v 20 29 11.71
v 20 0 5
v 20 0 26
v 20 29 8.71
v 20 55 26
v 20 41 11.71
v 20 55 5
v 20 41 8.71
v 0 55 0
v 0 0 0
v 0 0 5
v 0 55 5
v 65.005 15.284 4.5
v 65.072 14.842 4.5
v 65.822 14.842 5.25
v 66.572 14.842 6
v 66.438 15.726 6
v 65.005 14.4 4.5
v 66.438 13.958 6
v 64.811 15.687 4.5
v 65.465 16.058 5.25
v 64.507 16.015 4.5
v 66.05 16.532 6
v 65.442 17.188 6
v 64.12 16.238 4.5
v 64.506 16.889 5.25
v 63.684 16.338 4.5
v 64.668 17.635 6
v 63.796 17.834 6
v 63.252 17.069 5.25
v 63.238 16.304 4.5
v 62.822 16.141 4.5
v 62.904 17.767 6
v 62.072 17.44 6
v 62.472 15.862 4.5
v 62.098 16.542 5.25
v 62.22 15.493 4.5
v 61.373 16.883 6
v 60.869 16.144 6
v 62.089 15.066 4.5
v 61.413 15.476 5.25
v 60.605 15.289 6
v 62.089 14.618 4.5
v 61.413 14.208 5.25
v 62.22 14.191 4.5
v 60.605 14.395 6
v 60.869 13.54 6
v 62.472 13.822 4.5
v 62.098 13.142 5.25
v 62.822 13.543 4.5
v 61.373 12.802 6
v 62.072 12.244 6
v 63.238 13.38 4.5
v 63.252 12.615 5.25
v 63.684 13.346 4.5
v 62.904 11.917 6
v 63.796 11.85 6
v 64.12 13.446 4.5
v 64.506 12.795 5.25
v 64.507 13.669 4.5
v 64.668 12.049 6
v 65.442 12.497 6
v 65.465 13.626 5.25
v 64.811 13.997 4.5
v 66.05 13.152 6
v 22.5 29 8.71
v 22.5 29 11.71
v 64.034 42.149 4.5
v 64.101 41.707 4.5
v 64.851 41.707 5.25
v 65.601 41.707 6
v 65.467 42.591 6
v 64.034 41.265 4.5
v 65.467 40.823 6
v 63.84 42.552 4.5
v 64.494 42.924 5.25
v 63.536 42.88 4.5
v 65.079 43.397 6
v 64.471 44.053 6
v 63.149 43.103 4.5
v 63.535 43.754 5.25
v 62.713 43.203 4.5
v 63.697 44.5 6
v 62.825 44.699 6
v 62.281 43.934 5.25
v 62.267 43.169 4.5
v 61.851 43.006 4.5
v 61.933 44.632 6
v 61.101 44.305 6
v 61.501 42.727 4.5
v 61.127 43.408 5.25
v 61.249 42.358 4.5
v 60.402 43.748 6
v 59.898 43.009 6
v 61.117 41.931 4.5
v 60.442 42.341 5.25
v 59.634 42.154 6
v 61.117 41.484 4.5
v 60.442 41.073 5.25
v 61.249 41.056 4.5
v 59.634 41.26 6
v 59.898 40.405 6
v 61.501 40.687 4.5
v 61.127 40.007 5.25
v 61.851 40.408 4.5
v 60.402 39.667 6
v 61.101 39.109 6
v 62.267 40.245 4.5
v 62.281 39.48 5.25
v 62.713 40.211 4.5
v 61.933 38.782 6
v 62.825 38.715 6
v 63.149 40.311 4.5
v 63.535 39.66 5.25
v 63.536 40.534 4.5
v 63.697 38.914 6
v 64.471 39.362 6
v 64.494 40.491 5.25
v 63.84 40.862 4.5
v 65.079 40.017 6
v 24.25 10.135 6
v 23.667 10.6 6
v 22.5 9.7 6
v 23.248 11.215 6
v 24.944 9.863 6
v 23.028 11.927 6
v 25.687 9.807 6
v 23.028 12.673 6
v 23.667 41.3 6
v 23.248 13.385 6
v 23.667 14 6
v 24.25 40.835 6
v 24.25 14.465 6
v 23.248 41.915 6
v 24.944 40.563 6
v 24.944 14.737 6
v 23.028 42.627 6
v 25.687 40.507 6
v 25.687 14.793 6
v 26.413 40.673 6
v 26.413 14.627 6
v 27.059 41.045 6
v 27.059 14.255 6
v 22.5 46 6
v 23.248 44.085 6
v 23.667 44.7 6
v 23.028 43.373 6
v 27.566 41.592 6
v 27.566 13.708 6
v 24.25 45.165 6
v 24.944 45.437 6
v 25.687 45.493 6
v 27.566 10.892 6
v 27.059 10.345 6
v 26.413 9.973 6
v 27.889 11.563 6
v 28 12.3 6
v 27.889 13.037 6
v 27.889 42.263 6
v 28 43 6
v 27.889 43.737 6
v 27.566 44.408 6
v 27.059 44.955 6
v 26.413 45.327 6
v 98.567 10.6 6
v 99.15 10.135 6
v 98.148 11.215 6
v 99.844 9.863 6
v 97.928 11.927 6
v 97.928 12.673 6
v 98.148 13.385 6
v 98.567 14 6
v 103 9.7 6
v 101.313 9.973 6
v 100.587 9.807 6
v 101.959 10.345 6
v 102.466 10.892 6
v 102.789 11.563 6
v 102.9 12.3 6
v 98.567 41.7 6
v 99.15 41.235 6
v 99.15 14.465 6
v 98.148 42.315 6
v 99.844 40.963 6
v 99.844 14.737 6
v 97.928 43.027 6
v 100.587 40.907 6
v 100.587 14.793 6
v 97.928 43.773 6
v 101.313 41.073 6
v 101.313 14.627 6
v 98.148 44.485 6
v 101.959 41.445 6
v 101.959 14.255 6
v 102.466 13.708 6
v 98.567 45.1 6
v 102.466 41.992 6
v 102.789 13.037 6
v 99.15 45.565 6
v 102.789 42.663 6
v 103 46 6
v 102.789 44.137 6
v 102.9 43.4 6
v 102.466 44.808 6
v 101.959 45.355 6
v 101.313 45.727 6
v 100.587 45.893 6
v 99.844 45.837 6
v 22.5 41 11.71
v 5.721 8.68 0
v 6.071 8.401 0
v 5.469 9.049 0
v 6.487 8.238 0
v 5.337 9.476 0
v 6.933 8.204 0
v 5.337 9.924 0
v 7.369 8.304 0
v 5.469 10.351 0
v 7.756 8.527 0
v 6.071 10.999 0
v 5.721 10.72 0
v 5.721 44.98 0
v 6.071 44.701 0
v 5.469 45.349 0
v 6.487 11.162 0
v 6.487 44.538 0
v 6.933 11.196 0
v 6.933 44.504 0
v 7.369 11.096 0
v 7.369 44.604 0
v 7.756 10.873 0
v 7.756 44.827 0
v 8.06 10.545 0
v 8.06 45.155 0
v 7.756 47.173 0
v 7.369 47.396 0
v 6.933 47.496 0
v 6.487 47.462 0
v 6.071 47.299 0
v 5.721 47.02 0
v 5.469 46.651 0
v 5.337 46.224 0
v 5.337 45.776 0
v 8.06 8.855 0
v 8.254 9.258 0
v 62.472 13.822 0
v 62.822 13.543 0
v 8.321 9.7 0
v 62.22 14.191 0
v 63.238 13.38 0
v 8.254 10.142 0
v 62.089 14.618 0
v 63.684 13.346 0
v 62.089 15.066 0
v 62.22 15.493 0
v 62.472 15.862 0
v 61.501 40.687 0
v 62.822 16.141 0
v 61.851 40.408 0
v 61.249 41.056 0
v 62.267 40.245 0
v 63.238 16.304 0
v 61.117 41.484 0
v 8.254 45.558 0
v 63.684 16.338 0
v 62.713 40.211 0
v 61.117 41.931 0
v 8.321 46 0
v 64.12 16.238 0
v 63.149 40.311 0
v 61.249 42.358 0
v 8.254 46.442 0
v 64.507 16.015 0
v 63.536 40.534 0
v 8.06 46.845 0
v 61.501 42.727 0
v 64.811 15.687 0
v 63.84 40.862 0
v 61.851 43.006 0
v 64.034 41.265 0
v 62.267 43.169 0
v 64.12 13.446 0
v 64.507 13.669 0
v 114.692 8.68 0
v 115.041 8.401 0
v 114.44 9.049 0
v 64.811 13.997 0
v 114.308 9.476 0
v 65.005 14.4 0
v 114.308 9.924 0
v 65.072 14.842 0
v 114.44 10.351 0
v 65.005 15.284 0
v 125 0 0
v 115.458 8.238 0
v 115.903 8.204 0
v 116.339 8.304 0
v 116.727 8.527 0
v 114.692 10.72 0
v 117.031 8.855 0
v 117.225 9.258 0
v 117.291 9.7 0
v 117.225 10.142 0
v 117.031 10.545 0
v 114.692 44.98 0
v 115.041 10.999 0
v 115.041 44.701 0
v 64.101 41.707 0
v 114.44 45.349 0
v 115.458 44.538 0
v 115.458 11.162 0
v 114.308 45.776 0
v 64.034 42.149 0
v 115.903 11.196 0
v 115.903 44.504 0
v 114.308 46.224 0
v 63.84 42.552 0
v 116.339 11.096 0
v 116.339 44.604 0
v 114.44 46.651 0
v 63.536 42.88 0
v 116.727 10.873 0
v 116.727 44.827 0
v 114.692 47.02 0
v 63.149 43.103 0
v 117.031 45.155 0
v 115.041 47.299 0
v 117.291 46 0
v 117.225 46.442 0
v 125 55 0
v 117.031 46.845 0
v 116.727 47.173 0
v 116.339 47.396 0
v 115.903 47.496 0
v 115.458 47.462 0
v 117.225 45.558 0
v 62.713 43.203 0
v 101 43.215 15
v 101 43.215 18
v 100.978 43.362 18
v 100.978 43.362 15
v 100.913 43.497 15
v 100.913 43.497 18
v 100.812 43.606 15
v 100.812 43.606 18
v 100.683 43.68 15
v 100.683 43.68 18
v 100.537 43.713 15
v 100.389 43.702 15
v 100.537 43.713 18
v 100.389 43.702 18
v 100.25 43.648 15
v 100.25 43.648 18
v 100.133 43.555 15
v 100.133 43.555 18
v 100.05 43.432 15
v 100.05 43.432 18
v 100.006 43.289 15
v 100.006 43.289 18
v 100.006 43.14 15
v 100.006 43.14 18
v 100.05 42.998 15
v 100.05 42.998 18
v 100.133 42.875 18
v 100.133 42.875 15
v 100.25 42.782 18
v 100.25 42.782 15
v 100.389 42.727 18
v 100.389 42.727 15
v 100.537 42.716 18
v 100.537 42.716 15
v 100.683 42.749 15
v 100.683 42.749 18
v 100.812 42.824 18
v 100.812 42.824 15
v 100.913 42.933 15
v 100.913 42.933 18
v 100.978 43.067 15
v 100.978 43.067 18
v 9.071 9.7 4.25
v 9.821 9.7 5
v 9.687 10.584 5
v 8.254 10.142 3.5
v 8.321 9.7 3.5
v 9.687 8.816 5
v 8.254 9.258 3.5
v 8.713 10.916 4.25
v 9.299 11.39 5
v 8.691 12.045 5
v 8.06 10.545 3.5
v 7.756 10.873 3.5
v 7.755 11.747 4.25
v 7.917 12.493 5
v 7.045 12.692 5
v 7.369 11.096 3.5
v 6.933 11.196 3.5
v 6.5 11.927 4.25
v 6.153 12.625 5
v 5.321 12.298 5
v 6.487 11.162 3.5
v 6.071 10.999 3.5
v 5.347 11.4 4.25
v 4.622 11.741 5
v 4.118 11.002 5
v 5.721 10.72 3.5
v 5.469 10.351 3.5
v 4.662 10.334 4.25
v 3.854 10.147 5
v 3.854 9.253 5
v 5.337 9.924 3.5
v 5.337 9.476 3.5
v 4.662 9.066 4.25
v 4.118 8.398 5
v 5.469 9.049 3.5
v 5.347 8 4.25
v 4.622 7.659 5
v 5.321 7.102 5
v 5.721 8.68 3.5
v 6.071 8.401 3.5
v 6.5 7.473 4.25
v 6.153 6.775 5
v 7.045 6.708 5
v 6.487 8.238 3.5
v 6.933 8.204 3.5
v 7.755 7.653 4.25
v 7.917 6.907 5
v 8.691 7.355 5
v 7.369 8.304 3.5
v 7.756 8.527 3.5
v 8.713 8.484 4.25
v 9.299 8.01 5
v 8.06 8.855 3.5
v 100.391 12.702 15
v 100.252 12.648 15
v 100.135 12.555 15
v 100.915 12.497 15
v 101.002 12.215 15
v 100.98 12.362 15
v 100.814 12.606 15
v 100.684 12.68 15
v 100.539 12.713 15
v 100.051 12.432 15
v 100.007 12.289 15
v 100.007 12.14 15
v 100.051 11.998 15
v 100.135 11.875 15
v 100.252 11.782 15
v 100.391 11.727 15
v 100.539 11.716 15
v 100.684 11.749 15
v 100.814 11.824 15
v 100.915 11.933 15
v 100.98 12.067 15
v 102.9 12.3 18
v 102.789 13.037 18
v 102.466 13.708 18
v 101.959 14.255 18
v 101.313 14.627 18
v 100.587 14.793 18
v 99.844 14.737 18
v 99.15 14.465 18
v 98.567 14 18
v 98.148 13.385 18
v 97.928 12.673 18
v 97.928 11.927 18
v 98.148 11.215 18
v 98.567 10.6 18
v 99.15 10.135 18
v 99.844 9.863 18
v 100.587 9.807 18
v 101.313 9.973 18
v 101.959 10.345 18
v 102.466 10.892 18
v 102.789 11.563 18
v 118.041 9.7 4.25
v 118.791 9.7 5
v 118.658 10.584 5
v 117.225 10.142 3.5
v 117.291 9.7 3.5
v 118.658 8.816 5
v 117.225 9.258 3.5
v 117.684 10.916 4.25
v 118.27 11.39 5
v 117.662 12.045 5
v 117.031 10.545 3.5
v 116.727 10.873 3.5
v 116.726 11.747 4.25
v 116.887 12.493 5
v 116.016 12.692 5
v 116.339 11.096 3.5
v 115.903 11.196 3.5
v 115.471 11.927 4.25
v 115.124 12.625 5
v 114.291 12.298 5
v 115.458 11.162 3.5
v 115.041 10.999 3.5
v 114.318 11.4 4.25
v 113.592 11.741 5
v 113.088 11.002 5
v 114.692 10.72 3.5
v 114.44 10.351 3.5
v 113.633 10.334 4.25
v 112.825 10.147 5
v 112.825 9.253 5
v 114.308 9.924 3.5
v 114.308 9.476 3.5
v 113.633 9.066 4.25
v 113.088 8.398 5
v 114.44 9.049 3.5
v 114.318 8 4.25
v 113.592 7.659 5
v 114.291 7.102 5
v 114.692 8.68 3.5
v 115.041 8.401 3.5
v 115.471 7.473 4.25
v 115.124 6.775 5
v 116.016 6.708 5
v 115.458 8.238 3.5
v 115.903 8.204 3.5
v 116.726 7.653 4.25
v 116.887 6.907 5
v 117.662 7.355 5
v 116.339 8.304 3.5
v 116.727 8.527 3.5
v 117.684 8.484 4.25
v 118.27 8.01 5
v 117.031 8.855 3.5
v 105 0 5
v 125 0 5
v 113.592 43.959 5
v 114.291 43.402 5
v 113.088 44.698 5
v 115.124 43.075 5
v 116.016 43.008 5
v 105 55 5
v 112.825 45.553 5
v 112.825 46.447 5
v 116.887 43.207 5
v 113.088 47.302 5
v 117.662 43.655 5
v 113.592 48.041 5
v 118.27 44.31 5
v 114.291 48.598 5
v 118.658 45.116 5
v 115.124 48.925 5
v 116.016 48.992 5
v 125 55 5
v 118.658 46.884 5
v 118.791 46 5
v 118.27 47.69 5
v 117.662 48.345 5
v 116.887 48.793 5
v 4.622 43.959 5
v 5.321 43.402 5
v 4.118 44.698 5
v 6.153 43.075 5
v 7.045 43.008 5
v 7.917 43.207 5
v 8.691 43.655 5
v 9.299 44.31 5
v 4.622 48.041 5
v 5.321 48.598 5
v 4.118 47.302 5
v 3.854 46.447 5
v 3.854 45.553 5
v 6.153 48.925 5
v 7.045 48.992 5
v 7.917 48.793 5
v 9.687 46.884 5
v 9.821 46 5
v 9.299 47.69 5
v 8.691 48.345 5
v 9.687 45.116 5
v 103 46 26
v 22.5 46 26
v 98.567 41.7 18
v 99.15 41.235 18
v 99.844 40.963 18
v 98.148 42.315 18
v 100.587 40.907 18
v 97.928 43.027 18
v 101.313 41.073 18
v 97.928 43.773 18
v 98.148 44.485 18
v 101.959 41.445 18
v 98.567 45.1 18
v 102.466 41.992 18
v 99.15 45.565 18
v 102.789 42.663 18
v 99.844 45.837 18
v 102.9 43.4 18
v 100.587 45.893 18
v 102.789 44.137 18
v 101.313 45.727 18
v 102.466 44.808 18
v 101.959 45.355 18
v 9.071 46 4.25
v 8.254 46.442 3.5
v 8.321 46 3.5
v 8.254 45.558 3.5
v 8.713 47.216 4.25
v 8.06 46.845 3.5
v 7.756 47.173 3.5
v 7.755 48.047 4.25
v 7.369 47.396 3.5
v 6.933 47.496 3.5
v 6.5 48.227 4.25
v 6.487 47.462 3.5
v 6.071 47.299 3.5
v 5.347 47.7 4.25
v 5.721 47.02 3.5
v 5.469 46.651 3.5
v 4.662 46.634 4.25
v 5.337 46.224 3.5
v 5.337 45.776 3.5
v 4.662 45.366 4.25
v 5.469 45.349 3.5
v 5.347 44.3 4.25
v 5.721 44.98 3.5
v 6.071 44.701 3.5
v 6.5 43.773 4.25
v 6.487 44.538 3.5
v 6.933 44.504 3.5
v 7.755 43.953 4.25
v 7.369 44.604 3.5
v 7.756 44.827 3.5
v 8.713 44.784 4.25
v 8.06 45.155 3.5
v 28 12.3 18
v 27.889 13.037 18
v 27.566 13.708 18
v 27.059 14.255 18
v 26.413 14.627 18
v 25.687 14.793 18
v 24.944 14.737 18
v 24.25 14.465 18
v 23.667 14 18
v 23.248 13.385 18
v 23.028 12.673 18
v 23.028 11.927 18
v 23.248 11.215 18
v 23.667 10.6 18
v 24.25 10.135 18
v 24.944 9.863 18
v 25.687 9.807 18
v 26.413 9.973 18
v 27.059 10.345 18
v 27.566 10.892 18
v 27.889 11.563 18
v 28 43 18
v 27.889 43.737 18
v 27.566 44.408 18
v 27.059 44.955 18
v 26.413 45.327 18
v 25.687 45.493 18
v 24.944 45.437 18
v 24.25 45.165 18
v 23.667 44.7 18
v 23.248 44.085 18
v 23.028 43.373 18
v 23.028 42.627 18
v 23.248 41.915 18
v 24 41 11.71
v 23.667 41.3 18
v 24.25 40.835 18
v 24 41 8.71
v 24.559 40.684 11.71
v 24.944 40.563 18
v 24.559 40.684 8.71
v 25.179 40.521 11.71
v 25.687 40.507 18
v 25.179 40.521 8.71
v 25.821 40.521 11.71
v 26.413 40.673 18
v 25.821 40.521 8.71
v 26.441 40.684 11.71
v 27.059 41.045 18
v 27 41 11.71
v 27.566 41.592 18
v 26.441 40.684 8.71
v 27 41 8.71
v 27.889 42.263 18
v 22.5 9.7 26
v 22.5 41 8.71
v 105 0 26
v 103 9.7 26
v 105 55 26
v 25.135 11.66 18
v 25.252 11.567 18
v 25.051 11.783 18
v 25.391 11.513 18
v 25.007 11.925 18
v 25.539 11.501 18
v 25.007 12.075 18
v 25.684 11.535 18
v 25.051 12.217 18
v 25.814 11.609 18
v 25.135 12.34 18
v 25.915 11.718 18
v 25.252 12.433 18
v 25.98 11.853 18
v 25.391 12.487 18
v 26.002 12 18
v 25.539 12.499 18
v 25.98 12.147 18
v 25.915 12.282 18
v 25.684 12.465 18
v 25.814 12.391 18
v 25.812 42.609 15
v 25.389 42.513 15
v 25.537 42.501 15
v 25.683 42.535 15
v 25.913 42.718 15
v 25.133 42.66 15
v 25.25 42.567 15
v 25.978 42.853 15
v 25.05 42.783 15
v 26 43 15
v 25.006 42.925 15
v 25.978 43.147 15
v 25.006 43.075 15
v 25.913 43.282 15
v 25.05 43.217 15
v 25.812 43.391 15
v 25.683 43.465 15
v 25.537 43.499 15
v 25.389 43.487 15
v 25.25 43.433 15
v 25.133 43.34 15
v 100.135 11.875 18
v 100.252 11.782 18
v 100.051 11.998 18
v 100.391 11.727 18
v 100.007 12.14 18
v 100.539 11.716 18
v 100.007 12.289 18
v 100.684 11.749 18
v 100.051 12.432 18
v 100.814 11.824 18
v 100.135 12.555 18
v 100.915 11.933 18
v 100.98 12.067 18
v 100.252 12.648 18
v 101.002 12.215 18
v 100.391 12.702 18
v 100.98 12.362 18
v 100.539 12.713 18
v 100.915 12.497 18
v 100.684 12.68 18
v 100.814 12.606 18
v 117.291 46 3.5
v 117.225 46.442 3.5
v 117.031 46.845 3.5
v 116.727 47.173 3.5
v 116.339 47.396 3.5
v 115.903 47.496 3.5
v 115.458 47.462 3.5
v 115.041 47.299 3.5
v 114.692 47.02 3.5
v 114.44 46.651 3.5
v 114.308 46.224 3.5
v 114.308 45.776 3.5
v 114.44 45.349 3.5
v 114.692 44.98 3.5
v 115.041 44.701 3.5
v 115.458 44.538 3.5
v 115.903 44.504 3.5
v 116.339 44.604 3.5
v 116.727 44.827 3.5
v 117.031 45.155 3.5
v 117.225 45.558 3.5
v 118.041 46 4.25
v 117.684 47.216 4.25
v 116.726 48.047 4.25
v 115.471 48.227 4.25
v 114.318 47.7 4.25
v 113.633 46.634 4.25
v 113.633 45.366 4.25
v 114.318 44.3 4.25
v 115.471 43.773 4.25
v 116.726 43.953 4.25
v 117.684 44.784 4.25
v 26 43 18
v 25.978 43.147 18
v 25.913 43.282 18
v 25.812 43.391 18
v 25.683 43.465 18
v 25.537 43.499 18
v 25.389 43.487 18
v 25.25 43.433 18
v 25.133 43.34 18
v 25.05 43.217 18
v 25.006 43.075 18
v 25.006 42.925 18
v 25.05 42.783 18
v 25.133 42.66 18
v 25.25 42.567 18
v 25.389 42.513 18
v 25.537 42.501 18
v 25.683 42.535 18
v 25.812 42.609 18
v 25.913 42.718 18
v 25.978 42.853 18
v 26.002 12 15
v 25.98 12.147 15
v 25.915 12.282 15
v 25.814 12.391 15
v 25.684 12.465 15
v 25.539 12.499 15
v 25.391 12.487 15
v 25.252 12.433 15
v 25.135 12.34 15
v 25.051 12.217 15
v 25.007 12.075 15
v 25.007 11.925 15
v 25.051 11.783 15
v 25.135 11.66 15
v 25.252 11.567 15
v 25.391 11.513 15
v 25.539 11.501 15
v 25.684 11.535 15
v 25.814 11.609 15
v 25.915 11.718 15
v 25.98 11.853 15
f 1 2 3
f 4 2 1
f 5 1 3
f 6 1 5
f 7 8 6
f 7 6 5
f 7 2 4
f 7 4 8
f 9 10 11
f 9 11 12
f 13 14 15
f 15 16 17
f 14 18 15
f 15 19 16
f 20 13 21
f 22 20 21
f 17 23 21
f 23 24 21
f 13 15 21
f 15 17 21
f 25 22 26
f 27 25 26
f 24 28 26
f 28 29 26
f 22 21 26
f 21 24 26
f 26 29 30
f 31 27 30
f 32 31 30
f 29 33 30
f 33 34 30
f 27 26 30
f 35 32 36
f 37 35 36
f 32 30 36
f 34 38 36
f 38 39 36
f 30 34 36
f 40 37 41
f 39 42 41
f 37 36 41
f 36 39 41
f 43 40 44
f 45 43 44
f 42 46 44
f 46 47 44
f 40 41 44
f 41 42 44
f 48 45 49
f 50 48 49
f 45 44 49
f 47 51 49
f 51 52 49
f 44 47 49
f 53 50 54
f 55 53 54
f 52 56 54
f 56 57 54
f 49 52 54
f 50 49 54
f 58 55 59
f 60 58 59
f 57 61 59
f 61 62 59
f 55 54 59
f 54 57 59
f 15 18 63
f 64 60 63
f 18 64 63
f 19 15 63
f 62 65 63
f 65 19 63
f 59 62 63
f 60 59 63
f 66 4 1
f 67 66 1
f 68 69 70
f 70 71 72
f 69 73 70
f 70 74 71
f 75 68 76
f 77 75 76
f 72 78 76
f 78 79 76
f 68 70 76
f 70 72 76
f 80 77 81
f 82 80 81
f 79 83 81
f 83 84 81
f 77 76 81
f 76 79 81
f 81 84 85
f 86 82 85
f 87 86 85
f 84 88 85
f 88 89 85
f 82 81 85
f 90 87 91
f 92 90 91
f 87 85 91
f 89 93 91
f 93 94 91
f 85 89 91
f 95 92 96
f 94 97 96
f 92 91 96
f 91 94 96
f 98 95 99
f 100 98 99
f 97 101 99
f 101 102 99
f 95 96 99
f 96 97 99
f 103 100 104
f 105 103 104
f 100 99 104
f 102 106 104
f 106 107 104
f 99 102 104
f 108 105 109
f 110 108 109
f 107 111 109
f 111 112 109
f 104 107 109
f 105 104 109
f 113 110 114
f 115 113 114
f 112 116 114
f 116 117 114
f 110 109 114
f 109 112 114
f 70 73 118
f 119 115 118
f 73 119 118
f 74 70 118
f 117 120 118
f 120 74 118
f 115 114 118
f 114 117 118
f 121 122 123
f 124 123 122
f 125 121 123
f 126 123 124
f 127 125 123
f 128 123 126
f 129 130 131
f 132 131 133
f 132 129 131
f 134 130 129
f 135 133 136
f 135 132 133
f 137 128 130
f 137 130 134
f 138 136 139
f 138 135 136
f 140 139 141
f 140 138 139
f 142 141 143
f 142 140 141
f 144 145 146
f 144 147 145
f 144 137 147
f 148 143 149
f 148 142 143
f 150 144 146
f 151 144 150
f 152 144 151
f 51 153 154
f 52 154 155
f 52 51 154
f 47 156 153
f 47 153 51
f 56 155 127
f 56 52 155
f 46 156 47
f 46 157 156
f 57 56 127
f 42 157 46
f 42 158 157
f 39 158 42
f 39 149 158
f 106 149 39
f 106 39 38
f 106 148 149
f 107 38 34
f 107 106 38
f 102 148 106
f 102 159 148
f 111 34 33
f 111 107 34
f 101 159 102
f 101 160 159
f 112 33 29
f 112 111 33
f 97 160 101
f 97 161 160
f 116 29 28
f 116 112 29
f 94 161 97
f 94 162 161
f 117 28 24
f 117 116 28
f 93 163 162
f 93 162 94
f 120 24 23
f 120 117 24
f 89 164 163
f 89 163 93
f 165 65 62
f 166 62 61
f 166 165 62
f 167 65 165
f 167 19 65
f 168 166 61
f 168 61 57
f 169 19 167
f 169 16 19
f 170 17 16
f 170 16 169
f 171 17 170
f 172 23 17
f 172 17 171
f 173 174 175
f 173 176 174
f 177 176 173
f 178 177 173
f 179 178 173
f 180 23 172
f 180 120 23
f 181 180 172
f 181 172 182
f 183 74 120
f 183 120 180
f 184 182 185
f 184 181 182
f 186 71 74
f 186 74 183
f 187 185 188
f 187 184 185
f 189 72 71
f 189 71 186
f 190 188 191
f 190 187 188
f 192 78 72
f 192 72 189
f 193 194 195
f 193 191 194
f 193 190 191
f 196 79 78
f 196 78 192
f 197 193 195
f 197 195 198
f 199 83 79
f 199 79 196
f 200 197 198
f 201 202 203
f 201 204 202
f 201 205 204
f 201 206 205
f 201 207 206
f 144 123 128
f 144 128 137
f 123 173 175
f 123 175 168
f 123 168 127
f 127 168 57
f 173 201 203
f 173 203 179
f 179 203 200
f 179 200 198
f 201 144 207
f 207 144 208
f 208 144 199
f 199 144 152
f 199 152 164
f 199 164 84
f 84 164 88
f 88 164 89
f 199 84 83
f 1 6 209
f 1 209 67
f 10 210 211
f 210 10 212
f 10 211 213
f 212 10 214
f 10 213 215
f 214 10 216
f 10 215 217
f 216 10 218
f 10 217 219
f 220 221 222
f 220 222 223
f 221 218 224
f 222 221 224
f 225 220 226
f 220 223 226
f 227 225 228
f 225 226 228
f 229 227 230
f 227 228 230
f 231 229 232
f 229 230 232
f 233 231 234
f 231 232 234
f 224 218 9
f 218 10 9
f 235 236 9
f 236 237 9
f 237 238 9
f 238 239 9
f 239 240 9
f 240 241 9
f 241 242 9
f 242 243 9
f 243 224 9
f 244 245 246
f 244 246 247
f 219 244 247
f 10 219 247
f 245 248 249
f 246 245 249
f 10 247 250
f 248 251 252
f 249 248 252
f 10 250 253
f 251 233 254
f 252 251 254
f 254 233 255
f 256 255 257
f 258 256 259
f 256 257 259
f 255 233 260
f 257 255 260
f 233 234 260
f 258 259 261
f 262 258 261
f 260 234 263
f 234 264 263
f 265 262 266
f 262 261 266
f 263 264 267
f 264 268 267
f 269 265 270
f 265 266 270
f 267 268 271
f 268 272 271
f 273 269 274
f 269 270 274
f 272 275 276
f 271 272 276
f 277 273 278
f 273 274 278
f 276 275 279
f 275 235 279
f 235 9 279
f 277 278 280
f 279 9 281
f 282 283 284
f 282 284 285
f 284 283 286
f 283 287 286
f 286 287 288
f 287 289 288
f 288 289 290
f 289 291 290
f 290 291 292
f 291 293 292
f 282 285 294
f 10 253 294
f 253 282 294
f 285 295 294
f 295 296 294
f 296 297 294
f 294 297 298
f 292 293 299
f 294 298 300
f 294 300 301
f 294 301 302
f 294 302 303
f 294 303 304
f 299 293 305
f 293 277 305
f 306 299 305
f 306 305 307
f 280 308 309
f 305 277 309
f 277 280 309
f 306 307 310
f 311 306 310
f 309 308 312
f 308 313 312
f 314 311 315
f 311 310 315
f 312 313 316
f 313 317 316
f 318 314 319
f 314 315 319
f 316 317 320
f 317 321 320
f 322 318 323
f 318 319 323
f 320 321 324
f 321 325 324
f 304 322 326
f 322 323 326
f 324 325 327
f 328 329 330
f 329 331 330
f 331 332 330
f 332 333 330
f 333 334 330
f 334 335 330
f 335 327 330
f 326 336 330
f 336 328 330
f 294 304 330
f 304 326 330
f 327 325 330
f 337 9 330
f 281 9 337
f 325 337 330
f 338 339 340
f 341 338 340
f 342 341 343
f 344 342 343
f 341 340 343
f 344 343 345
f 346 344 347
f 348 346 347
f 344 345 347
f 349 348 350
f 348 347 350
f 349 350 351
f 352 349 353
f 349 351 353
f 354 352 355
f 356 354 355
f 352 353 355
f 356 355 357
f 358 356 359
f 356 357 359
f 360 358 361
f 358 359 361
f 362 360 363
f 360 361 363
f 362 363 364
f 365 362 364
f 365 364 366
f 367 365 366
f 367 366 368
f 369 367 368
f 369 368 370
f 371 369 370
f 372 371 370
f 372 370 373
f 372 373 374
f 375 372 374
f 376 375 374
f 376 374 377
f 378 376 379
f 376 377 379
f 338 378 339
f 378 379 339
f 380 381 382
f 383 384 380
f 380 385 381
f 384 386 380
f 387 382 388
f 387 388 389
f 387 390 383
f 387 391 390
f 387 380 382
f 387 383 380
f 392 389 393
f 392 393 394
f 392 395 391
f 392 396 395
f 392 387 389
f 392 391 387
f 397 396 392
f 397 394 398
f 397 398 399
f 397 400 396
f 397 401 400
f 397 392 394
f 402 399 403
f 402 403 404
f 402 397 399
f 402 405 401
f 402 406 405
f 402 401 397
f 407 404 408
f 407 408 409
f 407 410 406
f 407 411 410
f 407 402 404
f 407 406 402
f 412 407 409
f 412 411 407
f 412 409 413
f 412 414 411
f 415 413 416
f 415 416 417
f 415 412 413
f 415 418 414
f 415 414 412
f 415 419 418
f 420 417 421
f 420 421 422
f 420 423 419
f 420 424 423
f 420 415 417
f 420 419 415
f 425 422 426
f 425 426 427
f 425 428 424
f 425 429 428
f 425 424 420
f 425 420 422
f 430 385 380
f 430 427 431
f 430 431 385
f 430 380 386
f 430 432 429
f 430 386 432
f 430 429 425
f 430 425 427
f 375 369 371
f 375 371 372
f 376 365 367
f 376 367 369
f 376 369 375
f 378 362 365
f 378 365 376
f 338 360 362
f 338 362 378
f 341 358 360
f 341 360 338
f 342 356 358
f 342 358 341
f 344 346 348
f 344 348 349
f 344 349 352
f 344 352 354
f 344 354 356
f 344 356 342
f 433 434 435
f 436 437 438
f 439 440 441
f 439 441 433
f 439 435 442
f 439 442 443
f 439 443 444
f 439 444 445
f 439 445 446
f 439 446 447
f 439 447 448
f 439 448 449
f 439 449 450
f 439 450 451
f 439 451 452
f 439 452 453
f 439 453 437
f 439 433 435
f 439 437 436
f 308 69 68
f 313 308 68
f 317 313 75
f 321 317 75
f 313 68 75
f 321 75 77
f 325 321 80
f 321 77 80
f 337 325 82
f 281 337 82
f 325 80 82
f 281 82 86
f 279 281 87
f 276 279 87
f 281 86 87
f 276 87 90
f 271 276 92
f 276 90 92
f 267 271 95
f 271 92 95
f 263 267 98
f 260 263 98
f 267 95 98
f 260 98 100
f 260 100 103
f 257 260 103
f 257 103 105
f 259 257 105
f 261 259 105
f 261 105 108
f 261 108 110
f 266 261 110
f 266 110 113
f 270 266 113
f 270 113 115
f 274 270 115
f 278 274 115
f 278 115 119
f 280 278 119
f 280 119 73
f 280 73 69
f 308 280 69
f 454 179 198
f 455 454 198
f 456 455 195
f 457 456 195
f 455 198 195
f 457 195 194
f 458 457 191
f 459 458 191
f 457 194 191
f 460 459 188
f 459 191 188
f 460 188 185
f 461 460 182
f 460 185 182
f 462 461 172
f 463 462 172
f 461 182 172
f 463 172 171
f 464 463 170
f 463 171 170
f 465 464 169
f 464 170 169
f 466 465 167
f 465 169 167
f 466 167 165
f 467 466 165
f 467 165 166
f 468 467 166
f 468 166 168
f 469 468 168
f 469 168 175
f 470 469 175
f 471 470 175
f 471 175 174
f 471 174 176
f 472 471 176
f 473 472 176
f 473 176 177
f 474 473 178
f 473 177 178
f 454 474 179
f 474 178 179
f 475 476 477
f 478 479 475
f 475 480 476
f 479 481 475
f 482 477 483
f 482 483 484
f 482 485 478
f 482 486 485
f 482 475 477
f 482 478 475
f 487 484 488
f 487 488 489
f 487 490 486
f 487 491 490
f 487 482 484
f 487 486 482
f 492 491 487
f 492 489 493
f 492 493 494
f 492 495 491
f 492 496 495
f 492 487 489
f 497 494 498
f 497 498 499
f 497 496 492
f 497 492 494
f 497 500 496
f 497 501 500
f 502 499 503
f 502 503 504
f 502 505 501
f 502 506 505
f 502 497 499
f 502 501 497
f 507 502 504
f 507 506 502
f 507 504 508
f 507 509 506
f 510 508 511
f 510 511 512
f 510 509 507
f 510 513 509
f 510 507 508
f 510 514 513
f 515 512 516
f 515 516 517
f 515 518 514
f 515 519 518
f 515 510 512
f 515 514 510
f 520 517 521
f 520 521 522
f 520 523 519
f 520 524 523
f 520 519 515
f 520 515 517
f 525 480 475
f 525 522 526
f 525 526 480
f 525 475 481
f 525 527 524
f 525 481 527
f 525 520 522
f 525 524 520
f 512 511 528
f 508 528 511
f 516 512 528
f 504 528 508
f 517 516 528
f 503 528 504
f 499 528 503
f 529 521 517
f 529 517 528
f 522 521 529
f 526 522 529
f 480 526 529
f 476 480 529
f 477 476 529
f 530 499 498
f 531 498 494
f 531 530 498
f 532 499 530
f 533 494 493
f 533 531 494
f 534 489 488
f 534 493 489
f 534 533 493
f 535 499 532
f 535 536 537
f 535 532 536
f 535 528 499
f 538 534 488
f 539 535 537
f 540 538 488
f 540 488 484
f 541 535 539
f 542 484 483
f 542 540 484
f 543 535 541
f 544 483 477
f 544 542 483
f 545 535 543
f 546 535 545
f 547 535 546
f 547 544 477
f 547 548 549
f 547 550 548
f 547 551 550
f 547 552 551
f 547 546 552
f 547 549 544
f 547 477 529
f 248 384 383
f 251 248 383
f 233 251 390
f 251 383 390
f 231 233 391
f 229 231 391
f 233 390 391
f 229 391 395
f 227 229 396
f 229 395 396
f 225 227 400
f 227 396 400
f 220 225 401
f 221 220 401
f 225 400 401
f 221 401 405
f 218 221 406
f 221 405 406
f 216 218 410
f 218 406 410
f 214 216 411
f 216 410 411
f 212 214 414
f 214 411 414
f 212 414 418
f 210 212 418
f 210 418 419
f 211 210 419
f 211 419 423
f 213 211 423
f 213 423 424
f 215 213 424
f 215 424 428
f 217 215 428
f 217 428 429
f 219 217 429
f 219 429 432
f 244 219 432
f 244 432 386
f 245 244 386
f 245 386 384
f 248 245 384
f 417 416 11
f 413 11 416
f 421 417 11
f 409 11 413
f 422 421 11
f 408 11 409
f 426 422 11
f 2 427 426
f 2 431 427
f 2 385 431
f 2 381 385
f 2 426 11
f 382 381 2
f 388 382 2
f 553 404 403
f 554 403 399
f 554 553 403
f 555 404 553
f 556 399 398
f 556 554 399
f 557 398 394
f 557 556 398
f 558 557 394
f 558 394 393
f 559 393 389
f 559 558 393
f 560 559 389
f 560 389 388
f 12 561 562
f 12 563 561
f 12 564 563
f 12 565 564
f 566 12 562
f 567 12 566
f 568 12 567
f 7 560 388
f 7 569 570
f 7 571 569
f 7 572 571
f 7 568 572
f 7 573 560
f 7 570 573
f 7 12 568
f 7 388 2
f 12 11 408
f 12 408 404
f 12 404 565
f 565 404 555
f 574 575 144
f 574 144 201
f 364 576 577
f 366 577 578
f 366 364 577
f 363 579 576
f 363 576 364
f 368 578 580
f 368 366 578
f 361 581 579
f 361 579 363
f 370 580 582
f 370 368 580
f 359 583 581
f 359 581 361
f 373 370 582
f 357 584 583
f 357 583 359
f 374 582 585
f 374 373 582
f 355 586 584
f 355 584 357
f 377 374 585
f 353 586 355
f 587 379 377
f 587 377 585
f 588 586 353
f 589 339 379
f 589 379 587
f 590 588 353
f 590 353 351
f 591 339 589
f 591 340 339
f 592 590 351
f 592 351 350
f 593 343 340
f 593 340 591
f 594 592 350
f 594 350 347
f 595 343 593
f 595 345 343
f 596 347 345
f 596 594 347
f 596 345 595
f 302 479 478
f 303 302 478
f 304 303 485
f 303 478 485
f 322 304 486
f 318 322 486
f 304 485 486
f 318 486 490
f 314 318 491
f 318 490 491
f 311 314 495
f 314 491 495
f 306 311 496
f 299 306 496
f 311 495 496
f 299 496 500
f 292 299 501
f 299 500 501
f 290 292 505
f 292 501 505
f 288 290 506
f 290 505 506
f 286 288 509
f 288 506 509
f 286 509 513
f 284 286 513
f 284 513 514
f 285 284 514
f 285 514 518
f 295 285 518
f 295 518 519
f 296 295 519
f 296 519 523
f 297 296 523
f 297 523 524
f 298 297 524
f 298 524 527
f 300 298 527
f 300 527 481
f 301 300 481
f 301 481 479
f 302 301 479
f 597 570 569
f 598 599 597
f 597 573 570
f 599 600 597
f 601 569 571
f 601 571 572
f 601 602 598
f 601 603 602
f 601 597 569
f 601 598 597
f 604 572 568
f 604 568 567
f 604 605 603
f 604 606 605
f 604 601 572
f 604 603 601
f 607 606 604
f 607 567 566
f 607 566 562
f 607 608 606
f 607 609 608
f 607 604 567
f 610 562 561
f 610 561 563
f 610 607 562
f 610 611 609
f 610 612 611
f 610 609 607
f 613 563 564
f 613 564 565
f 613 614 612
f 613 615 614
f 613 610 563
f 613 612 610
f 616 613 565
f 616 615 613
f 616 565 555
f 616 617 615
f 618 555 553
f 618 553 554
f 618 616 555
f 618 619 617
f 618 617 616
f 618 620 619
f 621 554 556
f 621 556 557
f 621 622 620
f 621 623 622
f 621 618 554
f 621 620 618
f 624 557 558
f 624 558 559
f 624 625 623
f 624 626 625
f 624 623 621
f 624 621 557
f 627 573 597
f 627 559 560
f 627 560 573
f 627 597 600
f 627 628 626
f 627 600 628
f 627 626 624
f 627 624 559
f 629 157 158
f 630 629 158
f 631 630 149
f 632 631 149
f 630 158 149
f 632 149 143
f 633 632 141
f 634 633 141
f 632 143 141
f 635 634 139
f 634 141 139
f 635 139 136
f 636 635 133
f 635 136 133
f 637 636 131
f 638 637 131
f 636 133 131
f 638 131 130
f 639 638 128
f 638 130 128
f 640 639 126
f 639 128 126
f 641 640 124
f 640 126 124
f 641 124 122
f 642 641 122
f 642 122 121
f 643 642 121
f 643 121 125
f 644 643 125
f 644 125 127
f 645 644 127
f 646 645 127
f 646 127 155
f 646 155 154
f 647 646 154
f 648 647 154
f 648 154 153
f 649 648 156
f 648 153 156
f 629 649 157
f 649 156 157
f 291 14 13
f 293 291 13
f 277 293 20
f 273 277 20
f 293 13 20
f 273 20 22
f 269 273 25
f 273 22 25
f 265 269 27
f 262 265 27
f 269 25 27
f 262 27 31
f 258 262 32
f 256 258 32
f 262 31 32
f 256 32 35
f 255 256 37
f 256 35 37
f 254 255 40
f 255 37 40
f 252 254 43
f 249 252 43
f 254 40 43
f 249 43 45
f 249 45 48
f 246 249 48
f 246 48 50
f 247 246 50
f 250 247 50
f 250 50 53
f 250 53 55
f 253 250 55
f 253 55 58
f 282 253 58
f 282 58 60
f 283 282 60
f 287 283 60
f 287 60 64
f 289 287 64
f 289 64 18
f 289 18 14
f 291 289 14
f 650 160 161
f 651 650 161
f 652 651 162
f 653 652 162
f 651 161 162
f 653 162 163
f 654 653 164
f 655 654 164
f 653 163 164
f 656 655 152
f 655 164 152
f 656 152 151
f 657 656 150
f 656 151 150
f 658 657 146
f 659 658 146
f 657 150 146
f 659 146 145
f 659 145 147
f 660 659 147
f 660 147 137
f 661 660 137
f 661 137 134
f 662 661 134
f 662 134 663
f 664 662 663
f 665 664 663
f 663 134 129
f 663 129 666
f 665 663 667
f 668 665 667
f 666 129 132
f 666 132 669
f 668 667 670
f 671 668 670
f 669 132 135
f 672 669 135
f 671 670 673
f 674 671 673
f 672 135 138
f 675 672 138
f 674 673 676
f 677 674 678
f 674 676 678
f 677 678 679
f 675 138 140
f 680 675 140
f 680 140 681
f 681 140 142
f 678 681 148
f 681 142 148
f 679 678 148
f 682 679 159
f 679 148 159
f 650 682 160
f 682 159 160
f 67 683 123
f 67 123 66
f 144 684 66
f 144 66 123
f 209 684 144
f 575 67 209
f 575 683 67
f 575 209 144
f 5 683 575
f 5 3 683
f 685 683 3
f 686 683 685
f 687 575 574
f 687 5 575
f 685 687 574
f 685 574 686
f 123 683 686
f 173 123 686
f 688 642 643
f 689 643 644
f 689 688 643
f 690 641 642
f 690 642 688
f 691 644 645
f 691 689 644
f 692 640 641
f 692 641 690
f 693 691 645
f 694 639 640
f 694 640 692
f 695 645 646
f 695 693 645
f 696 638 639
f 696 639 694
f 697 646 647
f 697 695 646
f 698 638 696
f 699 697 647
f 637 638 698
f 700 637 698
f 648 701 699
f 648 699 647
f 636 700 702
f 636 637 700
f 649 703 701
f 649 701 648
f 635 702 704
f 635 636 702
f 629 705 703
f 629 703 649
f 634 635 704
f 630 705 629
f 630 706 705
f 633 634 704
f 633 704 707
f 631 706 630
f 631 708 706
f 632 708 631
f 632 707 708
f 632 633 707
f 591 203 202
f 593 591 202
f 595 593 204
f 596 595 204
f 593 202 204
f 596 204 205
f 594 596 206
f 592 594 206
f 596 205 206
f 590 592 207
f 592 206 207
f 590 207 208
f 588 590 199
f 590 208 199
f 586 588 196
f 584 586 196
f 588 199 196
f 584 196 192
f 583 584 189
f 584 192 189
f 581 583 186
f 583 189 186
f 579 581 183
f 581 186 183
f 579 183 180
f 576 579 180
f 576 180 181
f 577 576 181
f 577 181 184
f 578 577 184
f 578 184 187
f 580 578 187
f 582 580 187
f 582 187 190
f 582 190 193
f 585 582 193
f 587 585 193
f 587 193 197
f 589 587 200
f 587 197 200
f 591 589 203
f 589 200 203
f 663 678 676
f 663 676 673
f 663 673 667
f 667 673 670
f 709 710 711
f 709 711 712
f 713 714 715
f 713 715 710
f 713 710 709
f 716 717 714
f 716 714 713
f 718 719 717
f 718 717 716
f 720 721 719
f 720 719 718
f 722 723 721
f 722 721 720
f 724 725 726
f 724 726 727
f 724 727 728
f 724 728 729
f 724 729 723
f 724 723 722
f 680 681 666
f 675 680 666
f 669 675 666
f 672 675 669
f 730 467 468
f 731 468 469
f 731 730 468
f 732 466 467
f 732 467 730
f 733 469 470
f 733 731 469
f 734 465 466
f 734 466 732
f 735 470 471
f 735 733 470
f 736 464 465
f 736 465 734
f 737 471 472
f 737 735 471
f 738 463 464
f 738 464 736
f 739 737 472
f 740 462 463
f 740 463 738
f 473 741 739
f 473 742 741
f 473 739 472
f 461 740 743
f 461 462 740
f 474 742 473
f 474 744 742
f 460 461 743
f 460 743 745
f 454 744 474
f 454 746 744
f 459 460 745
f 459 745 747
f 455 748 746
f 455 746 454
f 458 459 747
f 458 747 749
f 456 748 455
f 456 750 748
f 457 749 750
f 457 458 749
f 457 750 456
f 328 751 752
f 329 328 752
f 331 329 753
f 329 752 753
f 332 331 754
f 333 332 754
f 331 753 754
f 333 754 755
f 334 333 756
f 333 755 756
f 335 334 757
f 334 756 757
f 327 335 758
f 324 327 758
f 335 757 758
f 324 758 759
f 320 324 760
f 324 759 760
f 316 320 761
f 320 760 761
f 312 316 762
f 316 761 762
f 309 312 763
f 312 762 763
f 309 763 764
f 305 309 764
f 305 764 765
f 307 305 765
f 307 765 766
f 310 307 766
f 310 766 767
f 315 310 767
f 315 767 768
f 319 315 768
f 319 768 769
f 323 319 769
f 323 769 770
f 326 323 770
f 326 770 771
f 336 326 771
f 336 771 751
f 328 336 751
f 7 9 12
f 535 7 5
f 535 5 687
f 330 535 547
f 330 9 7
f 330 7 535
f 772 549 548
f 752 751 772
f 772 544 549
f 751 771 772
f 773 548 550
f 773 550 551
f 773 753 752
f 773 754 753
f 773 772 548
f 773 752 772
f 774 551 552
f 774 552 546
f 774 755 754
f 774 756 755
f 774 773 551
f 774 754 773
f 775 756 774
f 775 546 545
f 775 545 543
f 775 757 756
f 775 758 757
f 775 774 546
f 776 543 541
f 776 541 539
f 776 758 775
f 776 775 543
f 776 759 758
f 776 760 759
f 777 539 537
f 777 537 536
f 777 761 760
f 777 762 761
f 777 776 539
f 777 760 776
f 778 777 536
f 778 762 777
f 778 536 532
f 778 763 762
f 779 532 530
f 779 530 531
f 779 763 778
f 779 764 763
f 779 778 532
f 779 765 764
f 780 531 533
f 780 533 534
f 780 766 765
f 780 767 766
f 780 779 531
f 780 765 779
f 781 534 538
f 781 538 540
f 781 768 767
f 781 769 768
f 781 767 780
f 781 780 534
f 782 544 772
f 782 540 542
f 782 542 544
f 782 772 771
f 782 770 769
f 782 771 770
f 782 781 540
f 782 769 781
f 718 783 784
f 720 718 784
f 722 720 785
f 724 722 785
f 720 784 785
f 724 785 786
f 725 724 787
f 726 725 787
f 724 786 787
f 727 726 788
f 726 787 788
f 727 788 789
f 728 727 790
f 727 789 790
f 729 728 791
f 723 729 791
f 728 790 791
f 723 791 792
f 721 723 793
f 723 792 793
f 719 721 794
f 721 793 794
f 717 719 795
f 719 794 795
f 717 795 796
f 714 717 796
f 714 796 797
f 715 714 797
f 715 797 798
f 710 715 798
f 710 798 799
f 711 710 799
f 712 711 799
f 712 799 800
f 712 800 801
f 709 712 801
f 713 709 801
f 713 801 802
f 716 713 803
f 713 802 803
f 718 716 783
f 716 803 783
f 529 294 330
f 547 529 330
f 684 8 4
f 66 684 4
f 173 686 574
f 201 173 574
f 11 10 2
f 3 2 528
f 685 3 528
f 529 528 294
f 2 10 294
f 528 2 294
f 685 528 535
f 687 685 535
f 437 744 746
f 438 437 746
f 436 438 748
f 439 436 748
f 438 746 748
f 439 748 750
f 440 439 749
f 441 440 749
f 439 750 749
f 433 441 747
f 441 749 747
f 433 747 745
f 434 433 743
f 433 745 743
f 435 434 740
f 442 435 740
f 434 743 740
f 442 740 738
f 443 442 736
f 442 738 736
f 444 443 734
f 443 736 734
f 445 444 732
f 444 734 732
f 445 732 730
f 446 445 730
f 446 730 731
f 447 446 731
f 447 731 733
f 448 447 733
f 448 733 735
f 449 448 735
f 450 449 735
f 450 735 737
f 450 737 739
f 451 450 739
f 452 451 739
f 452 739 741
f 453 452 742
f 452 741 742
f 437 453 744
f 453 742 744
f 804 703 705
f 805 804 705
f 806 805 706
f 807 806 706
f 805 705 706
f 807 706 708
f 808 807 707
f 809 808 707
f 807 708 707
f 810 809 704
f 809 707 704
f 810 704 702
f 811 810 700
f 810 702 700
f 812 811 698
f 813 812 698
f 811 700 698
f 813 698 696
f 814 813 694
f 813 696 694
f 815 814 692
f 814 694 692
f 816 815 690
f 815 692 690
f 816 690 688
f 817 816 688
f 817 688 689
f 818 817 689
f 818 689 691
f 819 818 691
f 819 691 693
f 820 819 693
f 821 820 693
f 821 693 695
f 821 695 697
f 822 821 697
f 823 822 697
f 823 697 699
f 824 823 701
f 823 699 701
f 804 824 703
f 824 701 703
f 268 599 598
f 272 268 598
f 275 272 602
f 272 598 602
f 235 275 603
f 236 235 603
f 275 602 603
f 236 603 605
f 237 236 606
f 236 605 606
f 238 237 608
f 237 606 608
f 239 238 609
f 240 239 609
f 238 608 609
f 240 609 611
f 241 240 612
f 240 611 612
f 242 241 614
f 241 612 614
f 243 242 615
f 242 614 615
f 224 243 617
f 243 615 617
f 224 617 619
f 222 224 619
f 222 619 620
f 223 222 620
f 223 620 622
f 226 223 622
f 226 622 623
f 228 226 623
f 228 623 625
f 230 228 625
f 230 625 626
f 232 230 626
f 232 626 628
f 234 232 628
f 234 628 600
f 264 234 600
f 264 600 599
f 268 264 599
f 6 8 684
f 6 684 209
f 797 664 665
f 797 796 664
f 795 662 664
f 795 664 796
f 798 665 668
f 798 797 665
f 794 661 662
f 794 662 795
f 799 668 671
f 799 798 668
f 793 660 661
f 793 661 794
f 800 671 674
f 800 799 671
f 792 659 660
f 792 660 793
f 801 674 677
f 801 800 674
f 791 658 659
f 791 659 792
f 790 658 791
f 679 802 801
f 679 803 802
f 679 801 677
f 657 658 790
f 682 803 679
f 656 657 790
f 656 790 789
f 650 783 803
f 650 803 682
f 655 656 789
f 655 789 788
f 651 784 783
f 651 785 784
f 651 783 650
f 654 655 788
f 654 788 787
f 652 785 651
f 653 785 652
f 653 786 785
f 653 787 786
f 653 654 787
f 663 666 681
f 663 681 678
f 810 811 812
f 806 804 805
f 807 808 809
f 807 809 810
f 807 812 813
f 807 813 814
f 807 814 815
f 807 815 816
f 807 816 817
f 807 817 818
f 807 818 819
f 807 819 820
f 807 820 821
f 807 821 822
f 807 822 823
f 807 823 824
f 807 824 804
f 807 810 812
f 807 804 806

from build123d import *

# Parameters (mm, degrees)
F0_W      = 125
F0_H      = 55
F1_DEPTH  = 5
F2_W      = 85
F2_H      = 55
F3_DEPTH  = 21
F4_W      = 80.5
F4_H      = 36.3
F5_DEPTH  = 20
F6_R      = 2.5
F7_DEPTH  = 12
F8_W      = 12
F8_H      = 3
F9_DEPTH  = 25
F10_R     = 0.5
F11_DEPTH = 3
F12_R     = 1.5
F13_DEPTH = 25
F14_SIZE  = 1.5


with BuildPart() as f1:
    # F0 (on Top) → F1 (new body)
    with BuildSketch(Plane.XY):
        with Locations((62.5, 27.5)):
            Rectangle(F0_W, F0_H)
    extrude(amount=F1_DEPTH)

    # F2 (on face) → F3 (join)
    with BuildSketch(Plane.XY.offset(5)):
        with Locations((62.5, 27.5)):
            Rectangle(F2_W, F2_H)
    extrude(amount=F3_DEPTH)

    # F4 (on face) → F5 (cut)
    with BuildSketch(Plane.XY.offset(26)):
        with Locations((62.75, 27.85)):
            Rectangle(F4_W, F4_H)
    extrude(amount=-F5_DEPTH, mode=Mode.SUBTRACT)

    # F6 (on face) → F7 (join)
    with BuildSketch(Plane.XY.offset(6)):
        with Locations((25.5, 43)):
            Circle(F6_R)
        with Locations((100.4, 43.4)):
            Circle(F6_R)
        with Locations((100.4, 12.3)):
            Circle(F6_R)
        with Locations((25.5, 12.3)):
            Circle(F6_R)
    extrude(amount=F7_DEPTH)

    # F8 (on face) → F9 (cut)
    with BuildSketch(Plane(origin=(20, 0, 0), x_dir=(0, -1, 0), z_dir=(-1, 0, 0))):
        with Locations((-35, 10.209870059)):
            Rectangle(F8_W, F8_H)
    extrude(amount=-F9_DEPTH, mode=Mode.SUBTRACT)

    # F10 (on face) → F11 (cut)
    with BuildSketch(Plane.XY.offset(18)):
        with Locations((25.5, 43)):
            Circle(F10_R)
        with Locations((25.5017764866, 12)):
            Circle(F10_R)
        with Locations((100.5, 43.2148650289)):
            Circle(F10_R)
        with Locations((100.5017764866, 12.2148650289)):
            Circle(F10_R)
    extrude(amount=-F11_DEPTH, mode=Mode.SUBTRACT)

    # F12 (on face) → F13 (cut)
    with BuildSketch(Plane.XY.offset(6)):
        with Locations((62.6007243991, 41.7070947587)):
            Circle(F12_R)
        with Locations((63.5717511177, 14.8420426995)):
            Circle(F12_R)
        with Locations((6.820677314, 46)):
            Circle(F12_R)
        with Locations((6.820677314, 9.7)):
            Circle(F12_R)
        with Locations((115.7913729548, 46)):
            Circle(F12_R)
        with Locations((115.7913729548, 9.7)):
            Circle(F12_R)
    extrude(amount=-F13_DEPTH, mode=Mode.SUBTRACT)

    # F14
    f14_edges = [f1.edges().sort_by_distance(p)[0] for p in [
        (5.320677, 46, 5),
        (5.320677, 9.7, 5),
        (114.291373, 9.7, 5),
        (114.291373, 46, 5),
        (61.100724, 41.707095, 6),
        (62.071751, 14.842043, 6),
    ]]
    chamfer(f14_edges, length=F14_SIZE)


solid = f1.part
